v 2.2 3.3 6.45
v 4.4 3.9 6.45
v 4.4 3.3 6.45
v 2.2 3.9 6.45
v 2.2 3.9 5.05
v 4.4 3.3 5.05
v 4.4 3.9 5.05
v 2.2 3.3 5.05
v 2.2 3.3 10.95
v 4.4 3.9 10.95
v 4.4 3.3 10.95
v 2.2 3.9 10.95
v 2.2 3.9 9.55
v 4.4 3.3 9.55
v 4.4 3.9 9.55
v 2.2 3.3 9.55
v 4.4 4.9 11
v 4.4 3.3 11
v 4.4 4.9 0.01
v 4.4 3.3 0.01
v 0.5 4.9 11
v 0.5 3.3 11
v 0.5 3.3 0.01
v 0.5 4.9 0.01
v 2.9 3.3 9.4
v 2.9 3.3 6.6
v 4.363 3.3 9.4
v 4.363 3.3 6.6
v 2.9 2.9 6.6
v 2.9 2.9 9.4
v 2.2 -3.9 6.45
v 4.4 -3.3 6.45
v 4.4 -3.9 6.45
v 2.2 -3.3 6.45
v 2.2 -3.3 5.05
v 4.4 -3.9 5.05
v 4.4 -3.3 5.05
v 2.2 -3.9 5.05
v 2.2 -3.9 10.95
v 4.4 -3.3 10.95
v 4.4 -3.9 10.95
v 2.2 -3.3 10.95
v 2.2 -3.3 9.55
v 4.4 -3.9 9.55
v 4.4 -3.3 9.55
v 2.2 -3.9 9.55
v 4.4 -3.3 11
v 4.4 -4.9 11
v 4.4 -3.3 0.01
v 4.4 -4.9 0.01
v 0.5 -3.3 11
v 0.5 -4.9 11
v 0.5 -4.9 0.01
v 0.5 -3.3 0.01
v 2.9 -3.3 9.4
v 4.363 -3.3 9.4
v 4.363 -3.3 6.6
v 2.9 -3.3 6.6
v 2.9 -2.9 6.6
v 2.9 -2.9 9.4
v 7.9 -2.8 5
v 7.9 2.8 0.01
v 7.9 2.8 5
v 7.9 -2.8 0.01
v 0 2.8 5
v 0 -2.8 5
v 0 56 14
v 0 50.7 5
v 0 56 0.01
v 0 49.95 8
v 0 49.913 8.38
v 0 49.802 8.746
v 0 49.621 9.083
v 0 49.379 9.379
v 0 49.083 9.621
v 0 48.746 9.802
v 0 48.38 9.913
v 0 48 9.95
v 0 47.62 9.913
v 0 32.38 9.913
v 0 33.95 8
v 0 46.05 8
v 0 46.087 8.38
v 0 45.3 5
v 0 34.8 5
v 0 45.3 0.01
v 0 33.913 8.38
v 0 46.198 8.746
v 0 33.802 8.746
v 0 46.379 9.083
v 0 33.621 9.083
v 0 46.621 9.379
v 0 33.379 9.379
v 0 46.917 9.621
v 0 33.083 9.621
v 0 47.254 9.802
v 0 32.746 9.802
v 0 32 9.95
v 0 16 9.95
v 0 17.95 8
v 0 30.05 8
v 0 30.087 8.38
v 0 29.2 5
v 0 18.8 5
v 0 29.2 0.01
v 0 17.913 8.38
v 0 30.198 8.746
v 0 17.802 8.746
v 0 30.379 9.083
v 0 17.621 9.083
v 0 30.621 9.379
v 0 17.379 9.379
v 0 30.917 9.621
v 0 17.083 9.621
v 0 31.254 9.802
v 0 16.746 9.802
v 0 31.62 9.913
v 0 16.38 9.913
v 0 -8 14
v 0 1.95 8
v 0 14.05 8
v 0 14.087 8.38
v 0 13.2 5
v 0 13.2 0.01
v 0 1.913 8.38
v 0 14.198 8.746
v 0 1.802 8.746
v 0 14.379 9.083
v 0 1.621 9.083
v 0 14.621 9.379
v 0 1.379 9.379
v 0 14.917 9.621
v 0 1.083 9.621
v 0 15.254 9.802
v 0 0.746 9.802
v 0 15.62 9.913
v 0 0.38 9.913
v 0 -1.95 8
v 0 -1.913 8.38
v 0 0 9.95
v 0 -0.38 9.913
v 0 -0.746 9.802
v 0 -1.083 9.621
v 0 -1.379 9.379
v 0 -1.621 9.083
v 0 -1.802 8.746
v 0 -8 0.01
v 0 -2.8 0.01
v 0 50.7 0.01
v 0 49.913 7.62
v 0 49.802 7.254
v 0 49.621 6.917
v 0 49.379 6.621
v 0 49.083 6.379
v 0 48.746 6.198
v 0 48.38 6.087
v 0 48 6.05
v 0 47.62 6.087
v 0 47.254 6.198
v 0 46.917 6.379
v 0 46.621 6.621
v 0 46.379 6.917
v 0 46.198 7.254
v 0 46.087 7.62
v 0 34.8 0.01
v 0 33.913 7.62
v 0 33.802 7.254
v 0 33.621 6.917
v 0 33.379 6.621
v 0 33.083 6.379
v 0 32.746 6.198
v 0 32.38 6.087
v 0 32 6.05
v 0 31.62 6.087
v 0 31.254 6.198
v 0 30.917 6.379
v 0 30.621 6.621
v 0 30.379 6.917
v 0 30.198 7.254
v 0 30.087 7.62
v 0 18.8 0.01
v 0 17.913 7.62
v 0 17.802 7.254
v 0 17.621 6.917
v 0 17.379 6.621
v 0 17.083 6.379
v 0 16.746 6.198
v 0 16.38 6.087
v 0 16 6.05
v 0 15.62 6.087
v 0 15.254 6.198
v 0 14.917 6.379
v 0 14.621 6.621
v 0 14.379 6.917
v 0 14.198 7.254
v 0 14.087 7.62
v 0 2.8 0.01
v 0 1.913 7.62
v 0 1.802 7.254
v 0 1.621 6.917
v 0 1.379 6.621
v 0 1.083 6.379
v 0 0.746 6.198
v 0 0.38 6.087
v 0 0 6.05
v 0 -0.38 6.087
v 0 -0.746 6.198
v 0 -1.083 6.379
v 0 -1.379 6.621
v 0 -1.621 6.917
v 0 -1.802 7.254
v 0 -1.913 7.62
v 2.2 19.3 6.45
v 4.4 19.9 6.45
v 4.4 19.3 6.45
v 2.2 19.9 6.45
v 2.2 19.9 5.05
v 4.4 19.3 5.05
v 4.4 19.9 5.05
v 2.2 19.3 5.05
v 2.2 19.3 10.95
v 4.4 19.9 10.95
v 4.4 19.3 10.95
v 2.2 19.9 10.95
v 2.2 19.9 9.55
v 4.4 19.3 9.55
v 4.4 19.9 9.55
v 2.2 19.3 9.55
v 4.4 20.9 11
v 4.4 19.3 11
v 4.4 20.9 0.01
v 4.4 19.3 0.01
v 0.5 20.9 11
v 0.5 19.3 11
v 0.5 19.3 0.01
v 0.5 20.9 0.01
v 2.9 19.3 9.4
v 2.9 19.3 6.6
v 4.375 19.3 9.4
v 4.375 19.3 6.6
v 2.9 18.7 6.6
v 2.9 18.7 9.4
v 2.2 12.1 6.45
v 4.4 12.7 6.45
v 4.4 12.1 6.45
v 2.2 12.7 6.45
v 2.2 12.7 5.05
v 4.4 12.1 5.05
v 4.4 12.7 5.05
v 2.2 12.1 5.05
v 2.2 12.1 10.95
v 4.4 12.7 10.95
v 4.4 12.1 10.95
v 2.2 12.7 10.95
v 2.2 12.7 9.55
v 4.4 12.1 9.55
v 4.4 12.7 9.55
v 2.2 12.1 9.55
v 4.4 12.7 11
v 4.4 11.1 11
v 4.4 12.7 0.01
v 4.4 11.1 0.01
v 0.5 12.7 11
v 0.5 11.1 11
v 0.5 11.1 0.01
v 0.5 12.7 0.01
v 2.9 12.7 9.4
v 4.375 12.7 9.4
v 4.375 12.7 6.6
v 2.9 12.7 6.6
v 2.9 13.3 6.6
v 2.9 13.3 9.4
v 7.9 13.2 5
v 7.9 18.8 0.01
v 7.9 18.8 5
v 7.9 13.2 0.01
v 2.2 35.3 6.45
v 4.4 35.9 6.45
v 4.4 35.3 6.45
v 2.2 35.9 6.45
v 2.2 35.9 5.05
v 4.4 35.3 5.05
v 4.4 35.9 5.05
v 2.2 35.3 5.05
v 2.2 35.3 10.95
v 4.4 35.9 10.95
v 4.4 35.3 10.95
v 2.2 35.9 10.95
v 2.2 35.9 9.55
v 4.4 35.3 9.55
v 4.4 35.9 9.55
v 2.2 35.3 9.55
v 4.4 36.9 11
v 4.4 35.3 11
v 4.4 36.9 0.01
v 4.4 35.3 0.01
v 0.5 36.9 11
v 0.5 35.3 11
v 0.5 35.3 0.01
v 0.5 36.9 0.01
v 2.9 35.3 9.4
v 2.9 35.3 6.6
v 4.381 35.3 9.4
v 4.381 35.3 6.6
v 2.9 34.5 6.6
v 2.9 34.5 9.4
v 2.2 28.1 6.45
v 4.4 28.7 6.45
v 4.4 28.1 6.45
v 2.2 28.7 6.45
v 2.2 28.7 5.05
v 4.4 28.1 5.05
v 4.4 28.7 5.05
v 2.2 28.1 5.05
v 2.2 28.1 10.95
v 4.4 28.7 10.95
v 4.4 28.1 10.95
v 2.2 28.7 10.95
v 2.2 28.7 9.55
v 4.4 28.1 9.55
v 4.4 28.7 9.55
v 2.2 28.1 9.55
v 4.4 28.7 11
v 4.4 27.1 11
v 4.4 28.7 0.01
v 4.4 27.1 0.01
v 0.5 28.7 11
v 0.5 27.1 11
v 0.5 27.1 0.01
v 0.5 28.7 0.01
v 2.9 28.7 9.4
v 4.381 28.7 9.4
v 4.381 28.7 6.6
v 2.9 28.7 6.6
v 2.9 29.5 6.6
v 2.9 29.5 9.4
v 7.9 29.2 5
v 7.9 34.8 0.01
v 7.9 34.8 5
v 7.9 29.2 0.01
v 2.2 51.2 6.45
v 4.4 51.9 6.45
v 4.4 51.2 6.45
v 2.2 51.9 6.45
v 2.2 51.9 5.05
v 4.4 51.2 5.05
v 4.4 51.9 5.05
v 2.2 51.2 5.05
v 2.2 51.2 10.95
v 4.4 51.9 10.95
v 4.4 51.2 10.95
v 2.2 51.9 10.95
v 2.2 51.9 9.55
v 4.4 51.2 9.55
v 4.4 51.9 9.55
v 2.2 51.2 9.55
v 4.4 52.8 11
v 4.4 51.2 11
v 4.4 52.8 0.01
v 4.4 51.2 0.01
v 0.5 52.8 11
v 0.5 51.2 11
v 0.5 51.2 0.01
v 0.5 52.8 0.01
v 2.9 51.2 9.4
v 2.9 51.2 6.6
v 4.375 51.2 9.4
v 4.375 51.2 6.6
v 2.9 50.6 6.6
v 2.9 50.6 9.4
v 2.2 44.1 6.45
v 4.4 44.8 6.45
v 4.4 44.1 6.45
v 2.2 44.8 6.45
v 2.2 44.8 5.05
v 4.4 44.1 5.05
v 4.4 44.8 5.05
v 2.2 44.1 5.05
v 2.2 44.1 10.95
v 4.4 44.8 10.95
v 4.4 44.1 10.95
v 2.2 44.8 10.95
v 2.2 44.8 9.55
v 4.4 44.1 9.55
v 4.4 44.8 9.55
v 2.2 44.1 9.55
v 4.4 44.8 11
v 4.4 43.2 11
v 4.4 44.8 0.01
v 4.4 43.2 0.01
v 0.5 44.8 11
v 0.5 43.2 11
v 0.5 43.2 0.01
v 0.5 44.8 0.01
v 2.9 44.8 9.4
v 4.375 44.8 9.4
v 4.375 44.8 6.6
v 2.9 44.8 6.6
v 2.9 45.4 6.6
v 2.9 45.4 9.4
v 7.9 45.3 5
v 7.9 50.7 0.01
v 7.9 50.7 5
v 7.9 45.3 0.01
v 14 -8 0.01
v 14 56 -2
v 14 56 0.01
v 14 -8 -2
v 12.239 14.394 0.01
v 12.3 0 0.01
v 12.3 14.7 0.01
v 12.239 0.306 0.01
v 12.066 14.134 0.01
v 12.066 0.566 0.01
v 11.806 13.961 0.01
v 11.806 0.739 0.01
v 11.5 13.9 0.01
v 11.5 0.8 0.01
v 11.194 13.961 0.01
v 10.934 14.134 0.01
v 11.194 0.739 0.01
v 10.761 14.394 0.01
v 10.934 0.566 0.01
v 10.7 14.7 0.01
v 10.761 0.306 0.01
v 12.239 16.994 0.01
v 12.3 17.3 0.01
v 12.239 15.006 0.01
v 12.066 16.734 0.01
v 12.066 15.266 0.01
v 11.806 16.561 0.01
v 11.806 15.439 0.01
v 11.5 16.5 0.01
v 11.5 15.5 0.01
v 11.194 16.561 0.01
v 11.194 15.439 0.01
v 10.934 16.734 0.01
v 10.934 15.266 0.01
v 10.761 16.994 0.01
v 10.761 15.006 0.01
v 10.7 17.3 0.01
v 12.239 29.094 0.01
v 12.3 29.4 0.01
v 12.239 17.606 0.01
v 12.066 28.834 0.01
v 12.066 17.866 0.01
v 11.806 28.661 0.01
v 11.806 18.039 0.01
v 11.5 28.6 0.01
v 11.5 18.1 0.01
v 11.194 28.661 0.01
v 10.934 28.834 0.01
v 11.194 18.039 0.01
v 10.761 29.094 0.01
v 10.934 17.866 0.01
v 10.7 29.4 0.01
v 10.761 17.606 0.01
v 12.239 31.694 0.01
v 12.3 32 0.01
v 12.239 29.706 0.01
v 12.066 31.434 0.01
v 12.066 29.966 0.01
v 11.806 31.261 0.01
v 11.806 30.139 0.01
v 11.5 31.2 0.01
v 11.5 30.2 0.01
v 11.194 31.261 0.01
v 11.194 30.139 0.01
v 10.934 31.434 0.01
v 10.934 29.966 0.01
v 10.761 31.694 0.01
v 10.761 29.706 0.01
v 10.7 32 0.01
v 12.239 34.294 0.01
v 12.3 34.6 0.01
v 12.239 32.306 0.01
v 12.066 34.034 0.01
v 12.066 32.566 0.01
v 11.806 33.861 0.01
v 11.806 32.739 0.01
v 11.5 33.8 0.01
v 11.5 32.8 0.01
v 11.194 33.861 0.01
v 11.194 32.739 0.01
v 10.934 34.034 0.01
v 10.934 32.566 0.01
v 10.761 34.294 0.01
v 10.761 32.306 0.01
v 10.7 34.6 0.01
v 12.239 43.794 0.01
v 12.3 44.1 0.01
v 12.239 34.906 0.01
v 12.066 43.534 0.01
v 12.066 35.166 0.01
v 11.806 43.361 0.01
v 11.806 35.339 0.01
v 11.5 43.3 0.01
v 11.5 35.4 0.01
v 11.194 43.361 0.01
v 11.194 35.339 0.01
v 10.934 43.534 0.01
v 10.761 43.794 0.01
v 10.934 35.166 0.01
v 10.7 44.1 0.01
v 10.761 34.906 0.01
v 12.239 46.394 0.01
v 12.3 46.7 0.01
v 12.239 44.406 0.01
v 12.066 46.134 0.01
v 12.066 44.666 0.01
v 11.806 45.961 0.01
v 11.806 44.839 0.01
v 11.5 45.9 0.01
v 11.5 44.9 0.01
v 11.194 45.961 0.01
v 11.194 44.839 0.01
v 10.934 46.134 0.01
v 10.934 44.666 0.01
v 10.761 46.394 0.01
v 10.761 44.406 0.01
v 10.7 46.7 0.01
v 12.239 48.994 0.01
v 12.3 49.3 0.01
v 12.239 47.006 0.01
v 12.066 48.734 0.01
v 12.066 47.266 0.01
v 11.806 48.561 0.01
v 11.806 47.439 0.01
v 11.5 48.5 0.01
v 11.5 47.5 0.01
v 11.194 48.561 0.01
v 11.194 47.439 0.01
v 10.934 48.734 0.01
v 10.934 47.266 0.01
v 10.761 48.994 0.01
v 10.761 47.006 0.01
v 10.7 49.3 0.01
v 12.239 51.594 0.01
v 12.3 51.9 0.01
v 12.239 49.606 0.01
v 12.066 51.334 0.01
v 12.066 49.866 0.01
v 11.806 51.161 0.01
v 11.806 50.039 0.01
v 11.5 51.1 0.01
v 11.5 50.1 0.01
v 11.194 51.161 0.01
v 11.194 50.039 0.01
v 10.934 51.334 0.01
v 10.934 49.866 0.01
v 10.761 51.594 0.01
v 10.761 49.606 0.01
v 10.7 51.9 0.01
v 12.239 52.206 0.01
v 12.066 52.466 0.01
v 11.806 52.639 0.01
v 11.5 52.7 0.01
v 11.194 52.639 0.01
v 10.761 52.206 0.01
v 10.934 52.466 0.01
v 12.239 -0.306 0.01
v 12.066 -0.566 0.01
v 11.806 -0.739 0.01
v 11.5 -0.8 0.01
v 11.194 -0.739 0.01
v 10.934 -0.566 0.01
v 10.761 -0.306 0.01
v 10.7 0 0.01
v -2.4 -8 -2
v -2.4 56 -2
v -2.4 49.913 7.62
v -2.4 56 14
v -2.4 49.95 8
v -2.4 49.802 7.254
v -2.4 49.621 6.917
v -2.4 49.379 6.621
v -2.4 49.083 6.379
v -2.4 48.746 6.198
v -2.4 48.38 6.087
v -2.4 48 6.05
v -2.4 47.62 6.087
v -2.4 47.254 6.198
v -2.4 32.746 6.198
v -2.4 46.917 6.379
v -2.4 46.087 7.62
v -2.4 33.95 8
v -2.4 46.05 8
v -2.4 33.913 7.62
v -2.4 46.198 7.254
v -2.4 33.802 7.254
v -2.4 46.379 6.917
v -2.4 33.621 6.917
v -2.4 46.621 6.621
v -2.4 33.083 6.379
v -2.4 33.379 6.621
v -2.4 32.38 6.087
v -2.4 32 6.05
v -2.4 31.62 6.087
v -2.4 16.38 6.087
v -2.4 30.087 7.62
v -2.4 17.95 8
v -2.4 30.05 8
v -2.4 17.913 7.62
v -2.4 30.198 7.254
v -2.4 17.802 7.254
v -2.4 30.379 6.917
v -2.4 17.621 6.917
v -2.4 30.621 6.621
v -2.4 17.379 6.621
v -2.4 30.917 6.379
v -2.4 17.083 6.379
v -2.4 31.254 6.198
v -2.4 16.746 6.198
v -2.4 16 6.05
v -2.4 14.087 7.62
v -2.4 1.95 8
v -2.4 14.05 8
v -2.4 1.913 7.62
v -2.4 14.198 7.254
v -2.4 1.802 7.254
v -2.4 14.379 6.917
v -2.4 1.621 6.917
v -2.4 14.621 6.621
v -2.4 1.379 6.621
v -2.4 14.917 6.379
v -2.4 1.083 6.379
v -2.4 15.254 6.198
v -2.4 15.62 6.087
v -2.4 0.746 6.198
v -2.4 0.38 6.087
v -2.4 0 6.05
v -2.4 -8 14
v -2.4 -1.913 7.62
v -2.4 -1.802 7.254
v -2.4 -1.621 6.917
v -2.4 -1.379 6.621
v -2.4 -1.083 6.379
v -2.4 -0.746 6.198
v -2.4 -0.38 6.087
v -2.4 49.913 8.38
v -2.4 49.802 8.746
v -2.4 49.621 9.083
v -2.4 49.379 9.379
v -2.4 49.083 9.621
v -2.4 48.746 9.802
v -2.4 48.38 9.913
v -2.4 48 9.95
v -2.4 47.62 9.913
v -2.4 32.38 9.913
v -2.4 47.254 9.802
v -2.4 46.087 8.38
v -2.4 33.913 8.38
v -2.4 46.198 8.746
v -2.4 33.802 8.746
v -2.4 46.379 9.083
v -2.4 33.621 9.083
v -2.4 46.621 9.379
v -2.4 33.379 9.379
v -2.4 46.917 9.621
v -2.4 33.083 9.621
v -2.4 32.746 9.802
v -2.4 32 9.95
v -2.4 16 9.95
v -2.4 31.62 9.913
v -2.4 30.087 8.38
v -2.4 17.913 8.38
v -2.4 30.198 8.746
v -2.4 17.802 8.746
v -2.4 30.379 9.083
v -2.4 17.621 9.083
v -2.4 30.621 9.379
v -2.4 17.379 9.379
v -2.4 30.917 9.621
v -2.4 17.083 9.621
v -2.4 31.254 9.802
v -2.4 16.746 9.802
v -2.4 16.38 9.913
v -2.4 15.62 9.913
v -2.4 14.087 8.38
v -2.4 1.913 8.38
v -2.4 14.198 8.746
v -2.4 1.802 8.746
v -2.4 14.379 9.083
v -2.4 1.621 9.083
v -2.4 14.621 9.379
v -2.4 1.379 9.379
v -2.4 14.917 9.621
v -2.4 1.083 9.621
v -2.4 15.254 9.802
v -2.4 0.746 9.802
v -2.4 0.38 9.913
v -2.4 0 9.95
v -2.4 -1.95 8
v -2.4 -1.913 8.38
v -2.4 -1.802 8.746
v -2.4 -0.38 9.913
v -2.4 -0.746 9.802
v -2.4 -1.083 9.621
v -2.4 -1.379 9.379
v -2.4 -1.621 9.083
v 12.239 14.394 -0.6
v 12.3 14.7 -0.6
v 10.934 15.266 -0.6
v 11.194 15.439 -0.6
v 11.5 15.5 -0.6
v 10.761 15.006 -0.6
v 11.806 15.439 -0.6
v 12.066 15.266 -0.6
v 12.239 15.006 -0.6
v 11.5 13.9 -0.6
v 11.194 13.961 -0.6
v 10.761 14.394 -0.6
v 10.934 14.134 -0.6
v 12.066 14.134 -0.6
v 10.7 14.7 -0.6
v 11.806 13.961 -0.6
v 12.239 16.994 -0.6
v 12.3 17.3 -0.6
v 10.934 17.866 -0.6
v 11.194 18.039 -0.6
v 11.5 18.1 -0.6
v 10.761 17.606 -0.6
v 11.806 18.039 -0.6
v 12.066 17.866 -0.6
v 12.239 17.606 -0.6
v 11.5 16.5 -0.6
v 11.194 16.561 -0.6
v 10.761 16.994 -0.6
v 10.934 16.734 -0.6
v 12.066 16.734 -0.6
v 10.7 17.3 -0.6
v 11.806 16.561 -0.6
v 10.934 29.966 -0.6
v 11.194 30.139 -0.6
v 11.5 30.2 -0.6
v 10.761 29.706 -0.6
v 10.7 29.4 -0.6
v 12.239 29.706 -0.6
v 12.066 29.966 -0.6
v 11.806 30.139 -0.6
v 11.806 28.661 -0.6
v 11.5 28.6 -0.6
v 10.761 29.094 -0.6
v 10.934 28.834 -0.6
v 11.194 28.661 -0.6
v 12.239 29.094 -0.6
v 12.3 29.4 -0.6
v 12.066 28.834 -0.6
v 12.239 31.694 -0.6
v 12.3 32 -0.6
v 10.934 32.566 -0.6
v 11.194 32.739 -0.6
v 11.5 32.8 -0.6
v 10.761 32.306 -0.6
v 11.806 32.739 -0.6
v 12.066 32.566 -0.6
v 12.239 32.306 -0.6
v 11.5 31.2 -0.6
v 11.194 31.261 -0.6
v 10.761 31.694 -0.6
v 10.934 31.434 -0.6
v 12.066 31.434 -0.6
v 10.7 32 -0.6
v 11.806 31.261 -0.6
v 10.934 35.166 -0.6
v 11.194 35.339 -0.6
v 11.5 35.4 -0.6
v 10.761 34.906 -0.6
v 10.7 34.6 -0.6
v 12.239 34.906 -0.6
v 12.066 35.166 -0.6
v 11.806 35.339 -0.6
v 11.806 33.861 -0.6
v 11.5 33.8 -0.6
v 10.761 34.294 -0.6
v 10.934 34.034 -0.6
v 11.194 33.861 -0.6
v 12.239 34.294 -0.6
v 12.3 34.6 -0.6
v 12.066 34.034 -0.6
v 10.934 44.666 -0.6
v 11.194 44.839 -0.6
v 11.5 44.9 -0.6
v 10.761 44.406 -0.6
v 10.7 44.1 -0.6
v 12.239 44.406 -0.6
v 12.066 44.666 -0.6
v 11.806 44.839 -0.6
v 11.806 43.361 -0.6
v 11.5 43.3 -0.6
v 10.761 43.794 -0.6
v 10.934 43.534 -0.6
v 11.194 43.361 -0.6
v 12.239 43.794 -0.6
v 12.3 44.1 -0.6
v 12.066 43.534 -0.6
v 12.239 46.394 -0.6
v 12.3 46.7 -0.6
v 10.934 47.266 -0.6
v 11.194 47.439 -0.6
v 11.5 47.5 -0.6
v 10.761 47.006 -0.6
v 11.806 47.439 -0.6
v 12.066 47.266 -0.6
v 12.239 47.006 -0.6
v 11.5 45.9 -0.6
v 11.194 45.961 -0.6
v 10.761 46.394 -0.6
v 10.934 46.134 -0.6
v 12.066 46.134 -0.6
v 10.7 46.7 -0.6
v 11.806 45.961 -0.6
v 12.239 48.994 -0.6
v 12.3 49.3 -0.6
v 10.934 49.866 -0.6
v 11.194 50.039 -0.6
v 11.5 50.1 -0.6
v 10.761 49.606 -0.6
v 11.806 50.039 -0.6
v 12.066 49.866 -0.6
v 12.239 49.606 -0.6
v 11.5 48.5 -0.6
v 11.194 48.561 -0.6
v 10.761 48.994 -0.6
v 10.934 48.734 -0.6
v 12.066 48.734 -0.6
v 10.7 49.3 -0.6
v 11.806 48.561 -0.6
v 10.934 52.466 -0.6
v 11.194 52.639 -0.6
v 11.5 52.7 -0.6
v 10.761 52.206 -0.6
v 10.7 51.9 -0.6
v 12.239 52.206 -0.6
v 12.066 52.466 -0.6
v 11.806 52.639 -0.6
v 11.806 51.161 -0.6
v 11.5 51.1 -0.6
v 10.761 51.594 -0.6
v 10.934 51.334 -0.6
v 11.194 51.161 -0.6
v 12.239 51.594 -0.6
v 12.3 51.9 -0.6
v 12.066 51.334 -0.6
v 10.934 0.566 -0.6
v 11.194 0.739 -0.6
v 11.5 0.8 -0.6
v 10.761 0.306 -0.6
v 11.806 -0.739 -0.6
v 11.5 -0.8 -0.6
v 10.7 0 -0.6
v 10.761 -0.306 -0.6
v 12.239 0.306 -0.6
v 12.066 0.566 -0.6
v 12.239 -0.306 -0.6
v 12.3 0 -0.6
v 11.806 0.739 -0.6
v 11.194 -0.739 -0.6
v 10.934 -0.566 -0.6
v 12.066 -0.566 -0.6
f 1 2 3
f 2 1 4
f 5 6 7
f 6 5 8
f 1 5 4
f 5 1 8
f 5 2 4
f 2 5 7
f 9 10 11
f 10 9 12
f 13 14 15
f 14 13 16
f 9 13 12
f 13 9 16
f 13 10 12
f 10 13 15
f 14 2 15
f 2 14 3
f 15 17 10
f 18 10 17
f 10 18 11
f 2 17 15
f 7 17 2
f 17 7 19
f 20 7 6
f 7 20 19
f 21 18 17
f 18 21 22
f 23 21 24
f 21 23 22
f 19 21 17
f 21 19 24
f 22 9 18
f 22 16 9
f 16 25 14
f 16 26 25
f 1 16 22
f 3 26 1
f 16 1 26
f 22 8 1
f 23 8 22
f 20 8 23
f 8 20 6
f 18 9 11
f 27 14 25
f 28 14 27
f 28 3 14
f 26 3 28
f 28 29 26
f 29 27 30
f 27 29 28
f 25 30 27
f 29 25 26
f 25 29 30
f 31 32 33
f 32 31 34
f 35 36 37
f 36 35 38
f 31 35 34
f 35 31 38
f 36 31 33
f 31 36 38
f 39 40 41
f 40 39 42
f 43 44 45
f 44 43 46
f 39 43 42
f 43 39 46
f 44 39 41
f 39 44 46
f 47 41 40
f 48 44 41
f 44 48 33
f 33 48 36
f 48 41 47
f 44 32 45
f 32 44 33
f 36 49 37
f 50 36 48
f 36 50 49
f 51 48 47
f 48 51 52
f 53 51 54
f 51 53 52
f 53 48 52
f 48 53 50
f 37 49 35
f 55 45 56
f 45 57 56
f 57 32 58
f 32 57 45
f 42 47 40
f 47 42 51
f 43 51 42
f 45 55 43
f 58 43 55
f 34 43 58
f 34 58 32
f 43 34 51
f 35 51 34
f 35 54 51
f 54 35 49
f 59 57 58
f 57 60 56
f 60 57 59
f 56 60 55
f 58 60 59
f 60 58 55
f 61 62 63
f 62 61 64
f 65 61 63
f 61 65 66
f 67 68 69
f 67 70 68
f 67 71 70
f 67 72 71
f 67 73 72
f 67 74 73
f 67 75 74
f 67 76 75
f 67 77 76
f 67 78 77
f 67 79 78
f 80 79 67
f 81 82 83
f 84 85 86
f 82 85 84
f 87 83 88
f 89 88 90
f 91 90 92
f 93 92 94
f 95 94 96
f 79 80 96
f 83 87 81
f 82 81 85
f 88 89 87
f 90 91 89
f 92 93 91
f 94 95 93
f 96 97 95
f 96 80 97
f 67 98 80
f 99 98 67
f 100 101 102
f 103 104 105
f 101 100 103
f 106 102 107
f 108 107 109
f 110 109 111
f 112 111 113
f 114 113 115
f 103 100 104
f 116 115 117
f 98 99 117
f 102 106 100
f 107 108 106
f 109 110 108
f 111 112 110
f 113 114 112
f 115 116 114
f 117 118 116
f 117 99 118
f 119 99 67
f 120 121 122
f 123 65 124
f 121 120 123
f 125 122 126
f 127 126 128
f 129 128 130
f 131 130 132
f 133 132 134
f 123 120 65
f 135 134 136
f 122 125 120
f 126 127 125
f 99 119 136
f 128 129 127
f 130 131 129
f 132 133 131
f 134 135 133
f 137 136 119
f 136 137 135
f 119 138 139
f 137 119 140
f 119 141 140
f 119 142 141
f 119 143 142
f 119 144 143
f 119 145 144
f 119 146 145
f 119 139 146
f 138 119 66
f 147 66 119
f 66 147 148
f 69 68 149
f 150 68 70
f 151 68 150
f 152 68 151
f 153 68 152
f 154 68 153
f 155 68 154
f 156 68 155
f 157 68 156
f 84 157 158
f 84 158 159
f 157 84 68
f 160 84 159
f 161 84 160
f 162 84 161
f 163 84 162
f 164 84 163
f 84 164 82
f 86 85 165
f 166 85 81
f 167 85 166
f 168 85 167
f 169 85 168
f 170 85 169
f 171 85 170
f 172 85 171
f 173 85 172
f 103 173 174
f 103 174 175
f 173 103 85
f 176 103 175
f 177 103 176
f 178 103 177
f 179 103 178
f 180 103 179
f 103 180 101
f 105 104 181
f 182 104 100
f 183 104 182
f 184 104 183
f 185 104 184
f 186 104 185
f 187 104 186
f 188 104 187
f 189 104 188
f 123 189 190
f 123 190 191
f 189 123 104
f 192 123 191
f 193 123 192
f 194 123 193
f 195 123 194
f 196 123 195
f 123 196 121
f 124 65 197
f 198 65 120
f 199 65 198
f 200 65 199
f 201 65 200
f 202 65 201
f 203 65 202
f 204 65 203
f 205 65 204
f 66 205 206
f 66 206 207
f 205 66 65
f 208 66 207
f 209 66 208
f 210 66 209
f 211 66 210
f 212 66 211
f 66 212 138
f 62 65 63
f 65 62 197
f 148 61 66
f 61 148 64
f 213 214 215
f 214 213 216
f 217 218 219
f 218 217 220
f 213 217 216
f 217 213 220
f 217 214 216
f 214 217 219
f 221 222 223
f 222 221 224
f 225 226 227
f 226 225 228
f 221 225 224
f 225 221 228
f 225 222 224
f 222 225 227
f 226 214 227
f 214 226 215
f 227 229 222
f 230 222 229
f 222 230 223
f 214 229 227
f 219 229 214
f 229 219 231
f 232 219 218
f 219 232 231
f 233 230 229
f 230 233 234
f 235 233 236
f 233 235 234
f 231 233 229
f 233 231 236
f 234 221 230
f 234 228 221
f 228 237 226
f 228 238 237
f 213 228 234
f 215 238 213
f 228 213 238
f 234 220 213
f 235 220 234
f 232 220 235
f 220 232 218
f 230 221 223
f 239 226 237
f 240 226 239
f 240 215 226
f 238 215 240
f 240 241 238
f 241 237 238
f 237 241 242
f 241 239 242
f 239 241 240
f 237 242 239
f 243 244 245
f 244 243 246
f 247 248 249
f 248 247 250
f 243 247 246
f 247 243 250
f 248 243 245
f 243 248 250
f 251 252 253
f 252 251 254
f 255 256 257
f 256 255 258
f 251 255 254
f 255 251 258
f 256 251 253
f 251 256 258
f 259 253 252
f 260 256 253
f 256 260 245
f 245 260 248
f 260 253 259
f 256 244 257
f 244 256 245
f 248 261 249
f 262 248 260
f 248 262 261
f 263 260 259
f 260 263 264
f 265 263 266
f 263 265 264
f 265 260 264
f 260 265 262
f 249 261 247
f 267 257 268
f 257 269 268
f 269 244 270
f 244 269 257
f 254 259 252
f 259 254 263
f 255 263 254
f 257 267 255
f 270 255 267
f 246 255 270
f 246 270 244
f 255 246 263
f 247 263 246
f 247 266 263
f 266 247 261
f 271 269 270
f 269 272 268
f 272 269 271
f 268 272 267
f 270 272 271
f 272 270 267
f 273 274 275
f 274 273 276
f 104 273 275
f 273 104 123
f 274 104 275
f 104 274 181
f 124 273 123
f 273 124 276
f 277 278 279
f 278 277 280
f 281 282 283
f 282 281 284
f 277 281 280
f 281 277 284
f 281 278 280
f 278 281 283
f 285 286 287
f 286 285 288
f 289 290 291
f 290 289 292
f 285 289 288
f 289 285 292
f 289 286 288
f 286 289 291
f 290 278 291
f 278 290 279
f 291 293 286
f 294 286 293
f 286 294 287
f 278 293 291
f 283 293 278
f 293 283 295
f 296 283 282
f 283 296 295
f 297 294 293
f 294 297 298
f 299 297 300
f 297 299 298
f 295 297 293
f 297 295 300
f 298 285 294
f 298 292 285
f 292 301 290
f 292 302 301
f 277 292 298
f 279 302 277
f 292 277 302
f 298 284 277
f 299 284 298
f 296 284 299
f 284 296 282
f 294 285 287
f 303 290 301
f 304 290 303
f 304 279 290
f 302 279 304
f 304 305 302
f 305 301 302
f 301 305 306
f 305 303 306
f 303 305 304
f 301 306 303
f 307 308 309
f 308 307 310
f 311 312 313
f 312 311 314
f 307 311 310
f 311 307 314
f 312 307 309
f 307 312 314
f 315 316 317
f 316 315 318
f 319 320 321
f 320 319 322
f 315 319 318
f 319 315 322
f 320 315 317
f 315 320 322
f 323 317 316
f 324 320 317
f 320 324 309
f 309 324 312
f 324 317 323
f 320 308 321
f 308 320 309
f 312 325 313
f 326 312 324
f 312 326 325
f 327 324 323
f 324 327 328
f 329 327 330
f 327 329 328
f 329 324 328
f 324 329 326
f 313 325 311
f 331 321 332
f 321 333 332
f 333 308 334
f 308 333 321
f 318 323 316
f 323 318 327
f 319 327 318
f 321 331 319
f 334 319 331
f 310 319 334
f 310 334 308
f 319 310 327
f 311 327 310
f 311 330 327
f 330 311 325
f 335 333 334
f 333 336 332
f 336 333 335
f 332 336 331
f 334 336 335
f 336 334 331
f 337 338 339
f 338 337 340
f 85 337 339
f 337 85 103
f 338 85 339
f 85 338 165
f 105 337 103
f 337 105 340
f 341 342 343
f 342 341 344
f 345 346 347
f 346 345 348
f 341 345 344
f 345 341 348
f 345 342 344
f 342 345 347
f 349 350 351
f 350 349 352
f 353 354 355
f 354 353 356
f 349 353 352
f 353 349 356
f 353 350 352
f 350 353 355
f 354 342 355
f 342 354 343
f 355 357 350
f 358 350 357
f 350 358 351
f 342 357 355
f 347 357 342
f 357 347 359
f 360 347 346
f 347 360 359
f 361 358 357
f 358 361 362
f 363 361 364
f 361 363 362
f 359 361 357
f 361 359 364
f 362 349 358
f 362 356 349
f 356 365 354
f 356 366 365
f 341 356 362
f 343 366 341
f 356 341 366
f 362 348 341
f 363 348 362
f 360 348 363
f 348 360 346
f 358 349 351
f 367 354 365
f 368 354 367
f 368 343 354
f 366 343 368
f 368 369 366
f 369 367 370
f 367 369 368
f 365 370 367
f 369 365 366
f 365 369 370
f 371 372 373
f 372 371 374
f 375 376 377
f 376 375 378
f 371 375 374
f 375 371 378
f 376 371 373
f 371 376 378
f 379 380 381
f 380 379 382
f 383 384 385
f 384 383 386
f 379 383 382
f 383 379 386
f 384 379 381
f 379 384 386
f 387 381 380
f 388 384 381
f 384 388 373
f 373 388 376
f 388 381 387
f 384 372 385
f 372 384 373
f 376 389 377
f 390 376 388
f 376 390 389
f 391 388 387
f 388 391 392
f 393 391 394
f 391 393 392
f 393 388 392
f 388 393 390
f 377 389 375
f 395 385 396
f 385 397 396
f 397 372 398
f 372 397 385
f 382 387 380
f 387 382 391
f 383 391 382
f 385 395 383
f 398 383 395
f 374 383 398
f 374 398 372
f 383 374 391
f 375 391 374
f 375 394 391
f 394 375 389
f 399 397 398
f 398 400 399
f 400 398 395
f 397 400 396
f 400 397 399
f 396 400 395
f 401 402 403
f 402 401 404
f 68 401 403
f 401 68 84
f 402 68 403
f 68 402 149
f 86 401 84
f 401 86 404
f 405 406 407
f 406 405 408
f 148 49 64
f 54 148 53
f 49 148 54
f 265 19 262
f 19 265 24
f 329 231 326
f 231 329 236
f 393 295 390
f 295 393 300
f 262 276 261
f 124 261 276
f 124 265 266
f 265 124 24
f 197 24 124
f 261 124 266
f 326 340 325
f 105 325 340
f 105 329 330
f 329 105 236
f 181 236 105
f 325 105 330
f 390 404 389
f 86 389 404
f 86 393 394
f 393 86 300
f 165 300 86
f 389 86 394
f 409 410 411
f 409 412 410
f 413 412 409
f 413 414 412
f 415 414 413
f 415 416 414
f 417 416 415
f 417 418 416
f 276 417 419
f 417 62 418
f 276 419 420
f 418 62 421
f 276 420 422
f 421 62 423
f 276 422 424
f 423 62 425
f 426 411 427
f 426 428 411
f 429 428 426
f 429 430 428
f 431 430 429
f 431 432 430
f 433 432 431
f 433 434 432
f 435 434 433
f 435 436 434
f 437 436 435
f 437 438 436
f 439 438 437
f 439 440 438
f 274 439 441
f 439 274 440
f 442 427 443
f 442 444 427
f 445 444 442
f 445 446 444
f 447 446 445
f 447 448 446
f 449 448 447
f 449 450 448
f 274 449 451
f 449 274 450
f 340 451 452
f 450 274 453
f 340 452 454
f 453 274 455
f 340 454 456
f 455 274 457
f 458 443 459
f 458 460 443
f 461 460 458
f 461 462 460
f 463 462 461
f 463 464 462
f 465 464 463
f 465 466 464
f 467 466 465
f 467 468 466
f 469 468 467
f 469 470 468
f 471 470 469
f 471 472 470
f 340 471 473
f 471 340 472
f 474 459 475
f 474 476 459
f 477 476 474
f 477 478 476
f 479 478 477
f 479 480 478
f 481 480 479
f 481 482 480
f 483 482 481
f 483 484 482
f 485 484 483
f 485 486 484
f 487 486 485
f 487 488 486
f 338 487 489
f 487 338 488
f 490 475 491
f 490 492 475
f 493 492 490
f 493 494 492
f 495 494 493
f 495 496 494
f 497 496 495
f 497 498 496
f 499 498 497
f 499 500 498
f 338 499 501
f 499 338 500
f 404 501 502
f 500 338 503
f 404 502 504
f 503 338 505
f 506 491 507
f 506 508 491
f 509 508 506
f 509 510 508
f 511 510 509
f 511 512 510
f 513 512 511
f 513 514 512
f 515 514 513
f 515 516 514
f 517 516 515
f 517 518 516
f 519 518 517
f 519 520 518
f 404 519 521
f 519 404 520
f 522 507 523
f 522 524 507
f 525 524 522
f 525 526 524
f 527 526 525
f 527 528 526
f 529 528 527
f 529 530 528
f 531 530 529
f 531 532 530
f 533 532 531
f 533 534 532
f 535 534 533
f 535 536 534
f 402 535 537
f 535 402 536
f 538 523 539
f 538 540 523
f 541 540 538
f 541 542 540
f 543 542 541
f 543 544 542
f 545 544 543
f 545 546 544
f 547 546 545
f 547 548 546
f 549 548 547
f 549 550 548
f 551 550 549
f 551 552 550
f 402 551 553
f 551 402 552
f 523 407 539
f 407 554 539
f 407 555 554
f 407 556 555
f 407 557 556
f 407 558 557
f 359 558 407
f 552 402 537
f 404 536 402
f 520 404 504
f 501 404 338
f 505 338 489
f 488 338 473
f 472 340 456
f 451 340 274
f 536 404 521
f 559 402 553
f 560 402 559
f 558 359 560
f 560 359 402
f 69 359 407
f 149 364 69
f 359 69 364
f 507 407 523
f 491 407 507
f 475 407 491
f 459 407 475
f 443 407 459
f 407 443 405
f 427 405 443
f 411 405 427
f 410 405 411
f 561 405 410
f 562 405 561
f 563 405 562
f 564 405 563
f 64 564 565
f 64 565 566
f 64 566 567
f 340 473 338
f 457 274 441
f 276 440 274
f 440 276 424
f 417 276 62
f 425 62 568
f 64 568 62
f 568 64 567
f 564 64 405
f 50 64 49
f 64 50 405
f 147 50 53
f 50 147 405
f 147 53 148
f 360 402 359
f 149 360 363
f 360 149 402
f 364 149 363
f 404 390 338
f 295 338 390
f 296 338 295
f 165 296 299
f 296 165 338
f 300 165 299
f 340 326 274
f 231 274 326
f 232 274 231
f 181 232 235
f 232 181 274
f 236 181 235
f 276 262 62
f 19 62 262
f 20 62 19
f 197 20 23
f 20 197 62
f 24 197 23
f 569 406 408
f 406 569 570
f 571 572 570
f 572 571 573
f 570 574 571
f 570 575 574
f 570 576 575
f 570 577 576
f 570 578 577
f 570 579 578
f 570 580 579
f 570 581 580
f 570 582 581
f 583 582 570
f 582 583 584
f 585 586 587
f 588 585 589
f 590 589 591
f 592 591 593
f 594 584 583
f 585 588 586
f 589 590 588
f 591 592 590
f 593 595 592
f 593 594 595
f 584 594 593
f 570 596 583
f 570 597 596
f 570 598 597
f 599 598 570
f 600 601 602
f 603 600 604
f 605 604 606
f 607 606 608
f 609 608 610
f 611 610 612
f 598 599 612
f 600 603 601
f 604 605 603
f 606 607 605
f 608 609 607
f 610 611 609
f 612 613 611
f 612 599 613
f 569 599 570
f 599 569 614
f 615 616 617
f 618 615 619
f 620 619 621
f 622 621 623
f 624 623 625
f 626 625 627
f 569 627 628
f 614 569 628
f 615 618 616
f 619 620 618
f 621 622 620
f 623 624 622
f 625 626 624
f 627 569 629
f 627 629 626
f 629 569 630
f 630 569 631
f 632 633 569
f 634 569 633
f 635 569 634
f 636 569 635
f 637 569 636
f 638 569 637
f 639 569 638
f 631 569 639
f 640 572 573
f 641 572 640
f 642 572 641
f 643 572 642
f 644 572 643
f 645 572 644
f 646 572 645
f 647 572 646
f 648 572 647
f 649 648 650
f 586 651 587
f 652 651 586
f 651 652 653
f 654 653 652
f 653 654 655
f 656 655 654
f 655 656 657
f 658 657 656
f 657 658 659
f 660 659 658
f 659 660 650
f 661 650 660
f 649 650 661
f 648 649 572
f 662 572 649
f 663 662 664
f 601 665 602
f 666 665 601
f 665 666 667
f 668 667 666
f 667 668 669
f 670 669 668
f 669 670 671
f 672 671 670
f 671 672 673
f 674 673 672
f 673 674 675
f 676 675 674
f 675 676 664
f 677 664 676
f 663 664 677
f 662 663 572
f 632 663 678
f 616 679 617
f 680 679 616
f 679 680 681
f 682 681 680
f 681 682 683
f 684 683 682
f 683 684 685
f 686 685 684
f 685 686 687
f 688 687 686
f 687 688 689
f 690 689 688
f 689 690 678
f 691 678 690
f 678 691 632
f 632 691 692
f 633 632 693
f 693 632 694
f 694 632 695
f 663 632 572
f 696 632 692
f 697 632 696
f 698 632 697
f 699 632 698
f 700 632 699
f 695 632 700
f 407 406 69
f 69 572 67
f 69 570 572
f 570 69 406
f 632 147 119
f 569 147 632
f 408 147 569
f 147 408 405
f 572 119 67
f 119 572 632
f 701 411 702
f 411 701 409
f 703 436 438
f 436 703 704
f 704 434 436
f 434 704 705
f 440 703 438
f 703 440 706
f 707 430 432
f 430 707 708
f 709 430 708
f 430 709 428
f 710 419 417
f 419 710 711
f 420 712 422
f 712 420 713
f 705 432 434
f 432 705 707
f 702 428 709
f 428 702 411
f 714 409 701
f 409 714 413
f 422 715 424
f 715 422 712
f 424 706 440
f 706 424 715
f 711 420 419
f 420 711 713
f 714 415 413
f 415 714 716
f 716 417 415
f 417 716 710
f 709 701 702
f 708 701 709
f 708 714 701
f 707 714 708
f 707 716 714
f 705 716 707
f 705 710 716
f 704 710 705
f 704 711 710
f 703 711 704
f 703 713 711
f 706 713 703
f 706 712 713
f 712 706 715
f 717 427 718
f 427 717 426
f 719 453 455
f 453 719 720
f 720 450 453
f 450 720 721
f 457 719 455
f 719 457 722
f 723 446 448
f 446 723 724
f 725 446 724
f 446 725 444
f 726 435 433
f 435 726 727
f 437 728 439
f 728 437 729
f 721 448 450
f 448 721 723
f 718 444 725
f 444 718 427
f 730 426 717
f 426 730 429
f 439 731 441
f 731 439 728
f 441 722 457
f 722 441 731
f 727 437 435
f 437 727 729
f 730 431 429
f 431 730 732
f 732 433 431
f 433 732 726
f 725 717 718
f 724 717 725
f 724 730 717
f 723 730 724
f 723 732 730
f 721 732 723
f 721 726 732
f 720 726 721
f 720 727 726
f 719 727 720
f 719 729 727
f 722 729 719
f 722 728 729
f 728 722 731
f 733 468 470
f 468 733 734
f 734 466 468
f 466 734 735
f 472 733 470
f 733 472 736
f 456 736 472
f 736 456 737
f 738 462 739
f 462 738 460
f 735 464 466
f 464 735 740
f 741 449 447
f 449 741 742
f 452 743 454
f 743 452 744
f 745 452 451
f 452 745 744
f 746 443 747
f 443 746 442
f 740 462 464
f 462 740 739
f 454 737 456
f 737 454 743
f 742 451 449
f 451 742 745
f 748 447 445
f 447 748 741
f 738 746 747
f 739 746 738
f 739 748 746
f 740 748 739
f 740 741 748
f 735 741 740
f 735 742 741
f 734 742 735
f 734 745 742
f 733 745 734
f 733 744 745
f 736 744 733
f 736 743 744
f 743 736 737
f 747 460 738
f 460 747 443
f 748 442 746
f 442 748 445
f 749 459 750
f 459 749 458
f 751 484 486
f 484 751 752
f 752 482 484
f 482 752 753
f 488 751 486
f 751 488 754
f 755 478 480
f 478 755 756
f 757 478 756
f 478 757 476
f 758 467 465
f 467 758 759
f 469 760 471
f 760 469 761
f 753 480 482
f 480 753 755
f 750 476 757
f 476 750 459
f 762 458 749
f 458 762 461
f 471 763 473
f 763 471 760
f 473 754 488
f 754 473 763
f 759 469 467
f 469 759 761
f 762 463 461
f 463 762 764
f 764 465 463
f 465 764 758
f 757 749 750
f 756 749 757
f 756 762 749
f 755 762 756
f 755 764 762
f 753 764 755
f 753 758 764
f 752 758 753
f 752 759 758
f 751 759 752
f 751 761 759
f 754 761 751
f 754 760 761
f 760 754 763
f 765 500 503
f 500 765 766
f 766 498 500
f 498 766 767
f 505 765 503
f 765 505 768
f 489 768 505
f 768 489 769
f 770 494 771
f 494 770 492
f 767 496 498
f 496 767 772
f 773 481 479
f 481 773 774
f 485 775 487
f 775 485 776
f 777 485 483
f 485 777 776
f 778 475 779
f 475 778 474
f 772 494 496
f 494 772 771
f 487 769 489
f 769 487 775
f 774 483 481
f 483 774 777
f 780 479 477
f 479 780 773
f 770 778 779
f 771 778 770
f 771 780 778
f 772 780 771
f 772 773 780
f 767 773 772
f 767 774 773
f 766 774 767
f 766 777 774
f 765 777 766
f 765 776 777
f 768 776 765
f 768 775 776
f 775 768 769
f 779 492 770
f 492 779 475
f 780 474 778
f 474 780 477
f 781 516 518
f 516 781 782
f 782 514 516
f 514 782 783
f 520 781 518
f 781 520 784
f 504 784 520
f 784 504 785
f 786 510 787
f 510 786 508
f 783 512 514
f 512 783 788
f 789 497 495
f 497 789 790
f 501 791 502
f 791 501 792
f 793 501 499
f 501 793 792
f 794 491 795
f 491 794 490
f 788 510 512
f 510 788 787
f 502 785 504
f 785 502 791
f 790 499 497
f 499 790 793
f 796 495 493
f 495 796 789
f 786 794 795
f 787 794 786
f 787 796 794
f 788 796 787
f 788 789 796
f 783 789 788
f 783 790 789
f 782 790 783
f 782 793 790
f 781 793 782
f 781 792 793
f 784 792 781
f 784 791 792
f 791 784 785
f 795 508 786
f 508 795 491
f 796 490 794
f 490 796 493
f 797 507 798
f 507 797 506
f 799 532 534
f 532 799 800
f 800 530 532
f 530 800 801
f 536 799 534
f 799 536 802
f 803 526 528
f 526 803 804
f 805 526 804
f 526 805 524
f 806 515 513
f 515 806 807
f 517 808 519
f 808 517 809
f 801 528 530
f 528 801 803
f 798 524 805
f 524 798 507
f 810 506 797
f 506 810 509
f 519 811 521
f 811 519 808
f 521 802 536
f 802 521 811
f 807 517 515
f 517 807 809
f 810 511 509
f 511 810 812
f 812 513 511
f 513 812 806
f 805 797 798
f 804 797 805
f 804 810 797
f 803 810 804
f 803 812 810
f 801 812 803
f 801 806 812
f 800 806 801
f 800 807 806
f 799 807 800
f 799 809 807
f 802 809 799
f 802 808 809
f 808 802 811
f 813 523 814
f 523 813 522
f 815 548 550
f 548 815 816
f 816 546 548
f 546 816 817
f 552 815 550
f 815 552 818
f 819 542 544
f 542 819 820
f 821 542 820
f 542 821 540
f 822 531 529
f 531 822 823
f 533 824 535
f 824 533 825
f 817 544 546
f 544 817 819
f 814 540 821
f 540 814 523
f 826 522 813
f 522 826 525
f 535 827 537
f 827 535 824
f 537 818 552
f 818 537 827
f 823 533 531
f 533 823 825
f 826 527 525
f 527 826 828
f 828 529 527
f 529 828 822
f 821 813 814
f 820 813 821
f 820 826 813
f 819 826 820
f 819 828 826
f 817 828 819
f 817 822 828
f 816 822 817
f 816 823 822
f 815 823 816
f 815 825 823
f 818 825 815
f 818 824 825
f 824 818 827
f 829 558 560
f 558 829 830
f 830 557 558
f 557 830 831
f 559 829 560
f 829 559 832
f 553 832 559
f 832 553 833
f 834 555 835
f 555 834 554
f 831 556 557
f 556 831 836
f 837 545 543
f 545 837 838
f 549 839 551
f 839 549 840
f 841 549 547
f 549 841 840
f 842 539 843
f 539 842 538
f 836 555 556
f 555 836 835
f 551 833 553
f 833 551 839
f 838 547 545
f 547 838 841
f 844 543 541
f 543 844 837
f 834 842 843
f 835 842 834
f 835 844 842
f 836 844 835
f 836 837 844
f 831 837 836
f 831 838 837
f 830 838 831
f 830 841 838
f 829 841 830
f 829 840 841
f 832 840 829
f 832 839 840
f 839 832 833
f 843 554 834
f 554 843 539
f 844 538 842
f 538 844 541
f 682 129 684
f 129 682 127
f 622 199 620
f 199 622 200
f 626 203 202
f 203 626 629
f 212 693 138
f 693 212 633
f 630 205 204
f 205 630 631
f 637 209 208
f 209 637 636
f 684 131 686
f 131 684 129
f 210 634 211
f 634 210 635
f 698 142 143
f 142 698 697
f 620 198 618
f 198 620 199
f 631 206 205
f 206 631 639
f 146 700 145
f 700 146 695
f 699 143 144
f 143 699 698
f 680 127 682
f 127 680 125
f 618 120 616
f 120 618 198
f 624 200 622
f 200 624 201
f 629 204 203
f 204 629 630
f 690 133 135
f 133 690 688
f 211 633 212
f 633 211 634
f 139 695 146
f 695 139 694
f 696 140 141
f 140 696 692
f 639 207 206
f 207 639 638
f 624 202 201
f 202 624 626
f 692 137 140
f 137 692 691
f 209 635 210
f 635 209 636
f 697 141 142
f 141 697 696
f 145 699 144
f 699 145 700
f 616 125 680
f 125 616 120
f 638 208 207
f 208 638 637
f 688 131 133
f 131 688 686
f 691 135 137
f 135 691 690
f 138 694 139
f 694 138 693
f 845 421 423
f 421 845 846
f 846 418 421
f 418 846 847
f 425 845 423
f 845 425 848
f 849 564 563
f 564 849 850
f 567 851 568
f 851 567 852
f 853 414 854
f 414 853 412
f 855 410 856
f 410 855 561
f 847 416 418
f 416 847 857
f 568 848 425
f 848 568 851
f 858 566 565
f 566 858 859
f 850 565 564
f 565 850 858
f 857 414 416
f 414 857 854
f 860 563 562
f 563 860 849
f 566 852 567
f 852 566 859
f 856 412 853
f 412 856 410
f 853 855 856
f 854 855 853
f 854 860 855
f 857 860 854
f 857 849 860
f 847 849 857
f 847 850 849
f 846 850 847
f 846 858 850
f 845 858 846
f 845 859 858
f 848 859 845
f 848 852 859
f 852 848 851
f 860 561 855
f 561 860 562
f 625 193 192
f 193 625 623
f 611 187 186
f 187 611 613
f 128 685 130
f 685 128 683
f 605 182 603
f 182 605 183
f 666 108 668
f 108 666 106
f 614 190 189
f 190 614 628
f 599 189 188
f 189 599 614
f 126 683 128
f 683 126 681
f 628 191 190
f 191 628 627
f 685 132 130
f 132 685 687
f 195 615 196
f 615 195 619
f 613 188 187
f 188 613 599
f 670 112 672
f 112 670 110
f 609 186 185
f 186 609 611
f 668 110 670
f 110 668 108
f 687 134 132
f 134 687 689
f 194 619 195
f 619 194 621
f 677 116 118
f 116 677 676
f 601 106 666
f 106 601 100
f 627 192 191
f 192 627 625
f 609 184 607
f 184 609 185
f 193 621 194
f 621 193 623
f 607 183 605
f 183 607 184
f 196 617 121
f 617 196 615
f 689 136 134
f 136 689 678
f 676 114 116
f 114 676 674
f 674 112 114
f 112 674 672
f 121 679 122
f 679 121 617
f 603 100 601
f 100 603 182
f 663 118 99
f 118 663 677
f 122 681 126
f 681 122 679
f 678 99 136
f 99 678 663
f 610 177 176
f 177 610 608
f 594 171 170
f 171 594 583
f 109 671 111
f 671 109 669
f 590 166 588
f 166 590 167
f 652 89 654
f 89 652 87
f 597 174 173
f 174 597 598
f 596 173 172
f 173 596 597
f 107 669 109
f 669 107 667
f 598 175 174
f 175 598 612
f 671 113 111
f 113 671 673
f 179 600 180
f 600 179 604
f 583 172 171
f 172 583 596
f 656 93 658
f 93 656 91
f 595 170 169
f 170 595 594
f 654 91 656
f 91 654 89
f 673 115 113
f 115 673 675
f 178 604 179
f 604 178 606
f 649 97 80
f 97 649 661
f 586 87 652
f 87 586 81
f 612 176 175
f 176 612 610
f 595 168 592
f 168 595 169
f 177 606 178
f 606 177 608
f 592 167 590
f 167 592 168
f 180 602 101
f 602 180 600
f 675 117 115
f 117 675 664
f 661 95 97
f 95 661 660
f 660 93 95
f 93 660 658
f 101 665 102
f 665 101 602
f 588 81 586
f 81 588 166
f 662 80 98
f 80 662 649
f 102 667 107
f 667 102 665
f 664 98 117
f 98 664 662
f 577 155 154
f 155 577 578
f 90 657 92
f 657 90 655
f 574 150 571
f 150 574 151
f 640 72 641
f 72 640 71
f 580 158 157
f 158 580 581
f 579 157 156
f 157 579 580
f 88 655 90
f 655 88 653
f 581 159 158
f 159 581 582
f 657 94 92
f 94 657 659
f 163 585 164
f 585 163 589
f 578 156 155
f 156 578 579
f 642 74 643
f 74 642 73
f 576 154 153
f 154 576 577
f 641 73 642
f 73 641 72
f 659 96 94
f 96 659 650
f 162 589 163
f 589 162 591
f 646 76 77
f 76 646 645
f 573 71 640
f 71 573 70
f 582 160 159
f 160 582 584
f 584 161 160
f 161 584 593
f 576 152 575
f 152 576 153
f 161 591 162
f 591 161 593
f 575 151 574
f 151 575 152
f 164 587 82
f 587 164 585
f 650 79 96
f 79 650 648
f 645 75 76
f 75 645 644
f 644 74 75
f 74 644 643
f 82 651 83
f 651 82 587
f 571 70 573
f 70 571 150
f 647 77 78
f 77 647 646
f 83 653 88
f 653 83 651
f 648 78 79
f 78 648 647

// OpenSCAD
// file: ../../util/marks.scad
//-----------------------------------------------------------------------
// Marks for fit pieces: n dots in a row, engraved into a face, so each
// variant can be told apart after printing. Origin: centre of the row, on
// the face; the dots cut down into -Z. Units: mm.
//-----------------------------------------------------------------------

markDotDia   = 1.6;
markDotPitch = 2.6;
markDotDepth = 0.6;

module markDots(n)
{
  for (i = [0 : n - 1])
    translate([(i - (n - 1)/2)*markDotPitch, 0, -markDotDepth])
      cylinder(d = markDotDia, h = markDotDepth + 1, $fn = 16);
}
// file: tactile-6x6.scad
//-----------------------------------------------------------------------
// 6 x 6 tactile switch, mounted on its side with the stem through a wall
//
// Push in and click: sit the switch on the seat a few mm back from the wall,
// legs to the sides, and push it forward. The stem goes into a plain round
// hole; the body pushes two flexing cheeks apart and their teeth snap in
// behind it. The teeth then take the press.
//
// Three modules, all in the same frame:
//   tact6x6Ghost()    the switch, for previews
//   tact6x6Holder()   the plastic inside the box: seat, cheeks and teeth
//   tact6x6WallCut()  subtract from the wall: the stem hole
//
// Frame: origin on the floor top at the wall's inner face, under the stem
// axis. +X into the box, Z up. The wall is X = -wall .. 0. Units: mm.
//
// standoff moves the switch back from the wall: use it when a stem is longer
// than you want standing proud (tact6x6Proud() says how far it stands).
// Sizes: the kit's switches by name in tact6Sizes ("lp", "4.3" .. "13");
// tact6x6Standoff(name, wall, proud) gives the standoff for a wanted proud.
//
// Use with `use <.../components/tactile-6x6/tactile-6x6.scad>`; call the
// modules inside translate/rotate to place them.
//-----------------------------------------------------------------------

//-- The switch. Defaults: BOJACK 6 x 6 low-profile, measured 2026-10-30
tact6Body      = 6.0;     // body, square
tact6BodyH     = 2.8;     // body thickness, mounting face to back (measured)
tact6Stem      = 3.6;     // stem length past the body's face (6.4 overall, measured)
tact6StemDia   = 3.5;     // measured
tact6LegPitch  = 6.5;     // legs leave two opposite sides at the back edge, this far apart
tact6LegSpan   = 4.5;     // the two legs on one side, apart
tact6LegLength = 3.5;     // past the body's back
tact6LegW      = 0.7;

//-- The holder
tact6Clearance = 0.3;     // between the body and each cheek
tact6Tooth     = 0.6;     // how far each tooth reaches in behind the body: CAL by the fit piece
tact6ToothRamp = 1.5;     // lead-in length behind the catch
tact6CatchGap  = 0.1;     // body's back to the catch faces: snug, so a press clicks instead of shoving it back
tact6HoleClear = 0.4;     // stem hole over the stem diameter
tact6Cheek     = 1.6;     // cheek thickness
tact6CheekGap  = 0.5;     // between the seat and each cheek, so the cheeks flex from the floor
tact6LegGroove = 1.4;     // grooves in the cheeks for the legs (0.7 legs, with their kinks)
tact6Start     = 1.0;     // stem tip to the wall when the switch is set down, before the push

//-- Sizes: the BOJACK 6 x 6 kit (B07ZN11155), by name. [name, overall, body]
//-- overall: back of the body to the stem tip, the kit listing's height. Only "lp" is
//-- measured; the others assume a 3.5 body: CAL each before relying on it
tact6Sizes = [
  ["lp",   6.4, 2.8],     // the low-profile one, measured 2026-10-30 (the defaults above)
  ["4.3",  4.3, 3.5],
  ["5",    5.0, 3.5],
  ["6",    6.0, 3.5],
  ["7",    7.0, 3.5],
  ["8",    8.0, 3.5],
  ["9",    9.0, 3.5],
  ["10",  10.0, 3.5],
  ["11",  11.0, 3.5],
  ["12",  12.0, 3.5],
  ["13",  13.0, 3.5],
];

function tact6Size(name) = let (i = search([name], tact6Sizes)[0])
  assert(i != [] && i != undef, str("unknown 6x6 size ", name)) tact6Sizes[i];
function tact6BodyHOf(name) = tact6Size(name)[2];
function tact6StemOf(name)  = tact6Size(name)[1] - tact6Size(name)[2];

//-- how far the stem stands proud of the wall's outer face
function tact6x6Proud(wall, standoff = 0, stem = tact6Stem) = stem - wall - standoff;

//-- the standoff that leaves a named switch's stem `proud` past a `wall`. Pass it to the
//-- modules with bodyH = tact6BodyHOf(name), stem = tact6StemOf(name)
function tact6x6Standoff(name, wall, proud) =
  let (s = tact6StemOf(name) - wall - proud)
  assert(s > -0.01, str("the ", name, " switch's stem is too short to stand ", proud, " past a ", wall, " wall"))
  max(s, 0);

//-- axisZ: stem axis above the floor; at least tact6Body/2 + 1
module tact6x6Ghost(axisZ, standoff = 0, bodyH = tact6BodyH, stem = tact6Stem)
{
  translate([standoff, 0, 0])
  {
    %color("DimGray") translate([0, -tact6Body/2, axisZ - tact6Body/2]) cube([bodyH, tact6Body, tact6Body]);
    %color("Black") translate([0, 0, axisZ]) rotate([0, -90, 0]) cylinder(d = tact6StemDia, h = stem, $fn = 24);
    for (s = [-1, 1], z = [-1, 1])
      %color("Silver") translate([bodyH, s*tact6LegPitch/2 - tact6LegW/2, axisZ + z*tact6LegSpan/2 - tact6LegW/2])
        cube([tact6LegLength, tact6LegW, tact6LegW]);
  }
}

module tact6x6Holder(axisZ, standoff = 0, clearance = tact6Clearance, tooth = tact6Tooth,
                     bodyH = tact6BodyH, stem = tact6Stem)
{
  half    = tact6Body/2;
  inner   = half + clearance;                       // cheek inner faces
  seatW   = inner - tact6CheekGap;                  // seat half-width: the cheeks clear it
  seatTop = axisZ - half;                           // the body rests on it, stem on the axis
  catchX  = standoff + bodyH + tact6CatchGap;       // teeth's catch faces, behind the body
  startX  = max(standoff + stem + tact6Start, catchX + tact6ToothRamp);   // body front when set down
  cheekX0 = max(standoff, 0.5);                     // clear of the wall, so the cheeks flex
  cheekX1 = catchX + tact6ToothRamp;
  legOut  = tact6LegPitch/2 + tact6LegW/2 + 0.3;    // groove depth: outside the legs and their kinks
  toothH  = tact6LegSpan - tact6LegGroove - 0.3;    // fits between the leg grooves
  assert(axisZ >= half + 1, "axisZ too low for the seat");

  //-- seat, from the wall back past where the switch is set down
  translate([0, -seatW, 0]) cube([startX + bodyH + 0.5, 2*seatW, seatTop]);
  //-- front stop when the body sits back from the wall
  if (standoff > 0)
    translate([standoff - 1.2, -seatW, 0]) cube([1.2, 2*seatW, seatTop + 1.5]);
  for (m = [0, 1])
    mirror([0, m, 0])
    {
      difference()
      {
        //-- cheek, from the floor to the body's top
        translate([cheekX0, inner, 0]) cube([cheekX1 - cheekX0, tact6Cheek, axisZ + half]);
        //-- grooves the legs slide along, open at the back
        for (z = [-1, 1])
          translate([standoff + bodyH - 0.6, inner - 1, axisZ + z*tact6LegSpan/2 - tact6LegGroove/2])
            cube([cheekX1, 1 + legOut - inner, tact6LegGroove]);
      }
      //-- tooth between the leg grooves: square catch face forward, ramp behind
      translate([0, 0, axisZ - toothH/2])
        linear_extrude(toothH)
          polygon([[catchX, inner + 0.01], [catchX, inner - tooth], [catchX + tact6ToothRamp, inner + 0.01]]);
    }
}

module tact6x6WallCut(axisZ, wall)
{
  translate([-wall - 1, 0, axisZ]) rotate([0, 90, 0])
    cylinder(d = tact6StemDia + tact6HoleClear, h = wall + 2, $fn = 32);
}
// main file
//-----------------------------------------------------------------------
// Fit piece: a strip of wall with four switch holders, marked 1 to 4 dots
// behind each. Set a switch down on each seat, legs to the sides, and push
// it into the hole until it clicks. Then press it, and try pulling it back.
//
//   1  tooth 0.4, clearance 0.3
//   2  tooth 0.6, clearance 0.3
//   3  tooth 0.8, clearance 0.3
//   4  tooth 0.6, clearance 0.2
//
// Prints base down, as exported, no supports. Units: mm.
//-----------------------------------------------------------------------

use <tactile-6x6.scad>
use <../../util/marks.scad>

wall      = 2.4;     // the project's wall: test at the thickness you'll use
axisZ     = 8;       // stem axis above the floor
baseThick = 2.0;
pitch     = 16;

stations  = [ [0.3, 0.4], [0.3, 0.6], [0.3, 0.8], [0.2, 0.6] ];   // [clearance, tooth]

n      = len(stations);
length = n*pitch;
depth  = wall + 8 + 6;                    // wall, seat, room for the dots
wallH  = axisZ + 6/2 + 3;

difference()
{
  union()
  {
    translate([-wall, -pitch/2, -baseThick]) cube([depth, length, baseThick + 0.01]);
    translate([-wall, -pitch/2, 0]) cube([wall, length, wallH]);
    for (i = [0 : n - 1])
      translate([0, i*pitch, -0.01]) tact6x6Holder(axisZ + 0.01, clearance = stations[i][0], tooth = stations[i][1]);
  }
  for (i = [0 : n - 1])
  {
    translate([0, i*pitch, 0]) tact6x6WallCut(axisZ, wall);
    translate([depth - wall - 2.5, i*pitch, 0]) rotate([0, 0, 90]) markDots(i + 1);
  }
}

if ($preview)
  for (i = [0 : n - 1]) translate([0, i*pitch, 0]) tact6x6Ghost(axisZ);
